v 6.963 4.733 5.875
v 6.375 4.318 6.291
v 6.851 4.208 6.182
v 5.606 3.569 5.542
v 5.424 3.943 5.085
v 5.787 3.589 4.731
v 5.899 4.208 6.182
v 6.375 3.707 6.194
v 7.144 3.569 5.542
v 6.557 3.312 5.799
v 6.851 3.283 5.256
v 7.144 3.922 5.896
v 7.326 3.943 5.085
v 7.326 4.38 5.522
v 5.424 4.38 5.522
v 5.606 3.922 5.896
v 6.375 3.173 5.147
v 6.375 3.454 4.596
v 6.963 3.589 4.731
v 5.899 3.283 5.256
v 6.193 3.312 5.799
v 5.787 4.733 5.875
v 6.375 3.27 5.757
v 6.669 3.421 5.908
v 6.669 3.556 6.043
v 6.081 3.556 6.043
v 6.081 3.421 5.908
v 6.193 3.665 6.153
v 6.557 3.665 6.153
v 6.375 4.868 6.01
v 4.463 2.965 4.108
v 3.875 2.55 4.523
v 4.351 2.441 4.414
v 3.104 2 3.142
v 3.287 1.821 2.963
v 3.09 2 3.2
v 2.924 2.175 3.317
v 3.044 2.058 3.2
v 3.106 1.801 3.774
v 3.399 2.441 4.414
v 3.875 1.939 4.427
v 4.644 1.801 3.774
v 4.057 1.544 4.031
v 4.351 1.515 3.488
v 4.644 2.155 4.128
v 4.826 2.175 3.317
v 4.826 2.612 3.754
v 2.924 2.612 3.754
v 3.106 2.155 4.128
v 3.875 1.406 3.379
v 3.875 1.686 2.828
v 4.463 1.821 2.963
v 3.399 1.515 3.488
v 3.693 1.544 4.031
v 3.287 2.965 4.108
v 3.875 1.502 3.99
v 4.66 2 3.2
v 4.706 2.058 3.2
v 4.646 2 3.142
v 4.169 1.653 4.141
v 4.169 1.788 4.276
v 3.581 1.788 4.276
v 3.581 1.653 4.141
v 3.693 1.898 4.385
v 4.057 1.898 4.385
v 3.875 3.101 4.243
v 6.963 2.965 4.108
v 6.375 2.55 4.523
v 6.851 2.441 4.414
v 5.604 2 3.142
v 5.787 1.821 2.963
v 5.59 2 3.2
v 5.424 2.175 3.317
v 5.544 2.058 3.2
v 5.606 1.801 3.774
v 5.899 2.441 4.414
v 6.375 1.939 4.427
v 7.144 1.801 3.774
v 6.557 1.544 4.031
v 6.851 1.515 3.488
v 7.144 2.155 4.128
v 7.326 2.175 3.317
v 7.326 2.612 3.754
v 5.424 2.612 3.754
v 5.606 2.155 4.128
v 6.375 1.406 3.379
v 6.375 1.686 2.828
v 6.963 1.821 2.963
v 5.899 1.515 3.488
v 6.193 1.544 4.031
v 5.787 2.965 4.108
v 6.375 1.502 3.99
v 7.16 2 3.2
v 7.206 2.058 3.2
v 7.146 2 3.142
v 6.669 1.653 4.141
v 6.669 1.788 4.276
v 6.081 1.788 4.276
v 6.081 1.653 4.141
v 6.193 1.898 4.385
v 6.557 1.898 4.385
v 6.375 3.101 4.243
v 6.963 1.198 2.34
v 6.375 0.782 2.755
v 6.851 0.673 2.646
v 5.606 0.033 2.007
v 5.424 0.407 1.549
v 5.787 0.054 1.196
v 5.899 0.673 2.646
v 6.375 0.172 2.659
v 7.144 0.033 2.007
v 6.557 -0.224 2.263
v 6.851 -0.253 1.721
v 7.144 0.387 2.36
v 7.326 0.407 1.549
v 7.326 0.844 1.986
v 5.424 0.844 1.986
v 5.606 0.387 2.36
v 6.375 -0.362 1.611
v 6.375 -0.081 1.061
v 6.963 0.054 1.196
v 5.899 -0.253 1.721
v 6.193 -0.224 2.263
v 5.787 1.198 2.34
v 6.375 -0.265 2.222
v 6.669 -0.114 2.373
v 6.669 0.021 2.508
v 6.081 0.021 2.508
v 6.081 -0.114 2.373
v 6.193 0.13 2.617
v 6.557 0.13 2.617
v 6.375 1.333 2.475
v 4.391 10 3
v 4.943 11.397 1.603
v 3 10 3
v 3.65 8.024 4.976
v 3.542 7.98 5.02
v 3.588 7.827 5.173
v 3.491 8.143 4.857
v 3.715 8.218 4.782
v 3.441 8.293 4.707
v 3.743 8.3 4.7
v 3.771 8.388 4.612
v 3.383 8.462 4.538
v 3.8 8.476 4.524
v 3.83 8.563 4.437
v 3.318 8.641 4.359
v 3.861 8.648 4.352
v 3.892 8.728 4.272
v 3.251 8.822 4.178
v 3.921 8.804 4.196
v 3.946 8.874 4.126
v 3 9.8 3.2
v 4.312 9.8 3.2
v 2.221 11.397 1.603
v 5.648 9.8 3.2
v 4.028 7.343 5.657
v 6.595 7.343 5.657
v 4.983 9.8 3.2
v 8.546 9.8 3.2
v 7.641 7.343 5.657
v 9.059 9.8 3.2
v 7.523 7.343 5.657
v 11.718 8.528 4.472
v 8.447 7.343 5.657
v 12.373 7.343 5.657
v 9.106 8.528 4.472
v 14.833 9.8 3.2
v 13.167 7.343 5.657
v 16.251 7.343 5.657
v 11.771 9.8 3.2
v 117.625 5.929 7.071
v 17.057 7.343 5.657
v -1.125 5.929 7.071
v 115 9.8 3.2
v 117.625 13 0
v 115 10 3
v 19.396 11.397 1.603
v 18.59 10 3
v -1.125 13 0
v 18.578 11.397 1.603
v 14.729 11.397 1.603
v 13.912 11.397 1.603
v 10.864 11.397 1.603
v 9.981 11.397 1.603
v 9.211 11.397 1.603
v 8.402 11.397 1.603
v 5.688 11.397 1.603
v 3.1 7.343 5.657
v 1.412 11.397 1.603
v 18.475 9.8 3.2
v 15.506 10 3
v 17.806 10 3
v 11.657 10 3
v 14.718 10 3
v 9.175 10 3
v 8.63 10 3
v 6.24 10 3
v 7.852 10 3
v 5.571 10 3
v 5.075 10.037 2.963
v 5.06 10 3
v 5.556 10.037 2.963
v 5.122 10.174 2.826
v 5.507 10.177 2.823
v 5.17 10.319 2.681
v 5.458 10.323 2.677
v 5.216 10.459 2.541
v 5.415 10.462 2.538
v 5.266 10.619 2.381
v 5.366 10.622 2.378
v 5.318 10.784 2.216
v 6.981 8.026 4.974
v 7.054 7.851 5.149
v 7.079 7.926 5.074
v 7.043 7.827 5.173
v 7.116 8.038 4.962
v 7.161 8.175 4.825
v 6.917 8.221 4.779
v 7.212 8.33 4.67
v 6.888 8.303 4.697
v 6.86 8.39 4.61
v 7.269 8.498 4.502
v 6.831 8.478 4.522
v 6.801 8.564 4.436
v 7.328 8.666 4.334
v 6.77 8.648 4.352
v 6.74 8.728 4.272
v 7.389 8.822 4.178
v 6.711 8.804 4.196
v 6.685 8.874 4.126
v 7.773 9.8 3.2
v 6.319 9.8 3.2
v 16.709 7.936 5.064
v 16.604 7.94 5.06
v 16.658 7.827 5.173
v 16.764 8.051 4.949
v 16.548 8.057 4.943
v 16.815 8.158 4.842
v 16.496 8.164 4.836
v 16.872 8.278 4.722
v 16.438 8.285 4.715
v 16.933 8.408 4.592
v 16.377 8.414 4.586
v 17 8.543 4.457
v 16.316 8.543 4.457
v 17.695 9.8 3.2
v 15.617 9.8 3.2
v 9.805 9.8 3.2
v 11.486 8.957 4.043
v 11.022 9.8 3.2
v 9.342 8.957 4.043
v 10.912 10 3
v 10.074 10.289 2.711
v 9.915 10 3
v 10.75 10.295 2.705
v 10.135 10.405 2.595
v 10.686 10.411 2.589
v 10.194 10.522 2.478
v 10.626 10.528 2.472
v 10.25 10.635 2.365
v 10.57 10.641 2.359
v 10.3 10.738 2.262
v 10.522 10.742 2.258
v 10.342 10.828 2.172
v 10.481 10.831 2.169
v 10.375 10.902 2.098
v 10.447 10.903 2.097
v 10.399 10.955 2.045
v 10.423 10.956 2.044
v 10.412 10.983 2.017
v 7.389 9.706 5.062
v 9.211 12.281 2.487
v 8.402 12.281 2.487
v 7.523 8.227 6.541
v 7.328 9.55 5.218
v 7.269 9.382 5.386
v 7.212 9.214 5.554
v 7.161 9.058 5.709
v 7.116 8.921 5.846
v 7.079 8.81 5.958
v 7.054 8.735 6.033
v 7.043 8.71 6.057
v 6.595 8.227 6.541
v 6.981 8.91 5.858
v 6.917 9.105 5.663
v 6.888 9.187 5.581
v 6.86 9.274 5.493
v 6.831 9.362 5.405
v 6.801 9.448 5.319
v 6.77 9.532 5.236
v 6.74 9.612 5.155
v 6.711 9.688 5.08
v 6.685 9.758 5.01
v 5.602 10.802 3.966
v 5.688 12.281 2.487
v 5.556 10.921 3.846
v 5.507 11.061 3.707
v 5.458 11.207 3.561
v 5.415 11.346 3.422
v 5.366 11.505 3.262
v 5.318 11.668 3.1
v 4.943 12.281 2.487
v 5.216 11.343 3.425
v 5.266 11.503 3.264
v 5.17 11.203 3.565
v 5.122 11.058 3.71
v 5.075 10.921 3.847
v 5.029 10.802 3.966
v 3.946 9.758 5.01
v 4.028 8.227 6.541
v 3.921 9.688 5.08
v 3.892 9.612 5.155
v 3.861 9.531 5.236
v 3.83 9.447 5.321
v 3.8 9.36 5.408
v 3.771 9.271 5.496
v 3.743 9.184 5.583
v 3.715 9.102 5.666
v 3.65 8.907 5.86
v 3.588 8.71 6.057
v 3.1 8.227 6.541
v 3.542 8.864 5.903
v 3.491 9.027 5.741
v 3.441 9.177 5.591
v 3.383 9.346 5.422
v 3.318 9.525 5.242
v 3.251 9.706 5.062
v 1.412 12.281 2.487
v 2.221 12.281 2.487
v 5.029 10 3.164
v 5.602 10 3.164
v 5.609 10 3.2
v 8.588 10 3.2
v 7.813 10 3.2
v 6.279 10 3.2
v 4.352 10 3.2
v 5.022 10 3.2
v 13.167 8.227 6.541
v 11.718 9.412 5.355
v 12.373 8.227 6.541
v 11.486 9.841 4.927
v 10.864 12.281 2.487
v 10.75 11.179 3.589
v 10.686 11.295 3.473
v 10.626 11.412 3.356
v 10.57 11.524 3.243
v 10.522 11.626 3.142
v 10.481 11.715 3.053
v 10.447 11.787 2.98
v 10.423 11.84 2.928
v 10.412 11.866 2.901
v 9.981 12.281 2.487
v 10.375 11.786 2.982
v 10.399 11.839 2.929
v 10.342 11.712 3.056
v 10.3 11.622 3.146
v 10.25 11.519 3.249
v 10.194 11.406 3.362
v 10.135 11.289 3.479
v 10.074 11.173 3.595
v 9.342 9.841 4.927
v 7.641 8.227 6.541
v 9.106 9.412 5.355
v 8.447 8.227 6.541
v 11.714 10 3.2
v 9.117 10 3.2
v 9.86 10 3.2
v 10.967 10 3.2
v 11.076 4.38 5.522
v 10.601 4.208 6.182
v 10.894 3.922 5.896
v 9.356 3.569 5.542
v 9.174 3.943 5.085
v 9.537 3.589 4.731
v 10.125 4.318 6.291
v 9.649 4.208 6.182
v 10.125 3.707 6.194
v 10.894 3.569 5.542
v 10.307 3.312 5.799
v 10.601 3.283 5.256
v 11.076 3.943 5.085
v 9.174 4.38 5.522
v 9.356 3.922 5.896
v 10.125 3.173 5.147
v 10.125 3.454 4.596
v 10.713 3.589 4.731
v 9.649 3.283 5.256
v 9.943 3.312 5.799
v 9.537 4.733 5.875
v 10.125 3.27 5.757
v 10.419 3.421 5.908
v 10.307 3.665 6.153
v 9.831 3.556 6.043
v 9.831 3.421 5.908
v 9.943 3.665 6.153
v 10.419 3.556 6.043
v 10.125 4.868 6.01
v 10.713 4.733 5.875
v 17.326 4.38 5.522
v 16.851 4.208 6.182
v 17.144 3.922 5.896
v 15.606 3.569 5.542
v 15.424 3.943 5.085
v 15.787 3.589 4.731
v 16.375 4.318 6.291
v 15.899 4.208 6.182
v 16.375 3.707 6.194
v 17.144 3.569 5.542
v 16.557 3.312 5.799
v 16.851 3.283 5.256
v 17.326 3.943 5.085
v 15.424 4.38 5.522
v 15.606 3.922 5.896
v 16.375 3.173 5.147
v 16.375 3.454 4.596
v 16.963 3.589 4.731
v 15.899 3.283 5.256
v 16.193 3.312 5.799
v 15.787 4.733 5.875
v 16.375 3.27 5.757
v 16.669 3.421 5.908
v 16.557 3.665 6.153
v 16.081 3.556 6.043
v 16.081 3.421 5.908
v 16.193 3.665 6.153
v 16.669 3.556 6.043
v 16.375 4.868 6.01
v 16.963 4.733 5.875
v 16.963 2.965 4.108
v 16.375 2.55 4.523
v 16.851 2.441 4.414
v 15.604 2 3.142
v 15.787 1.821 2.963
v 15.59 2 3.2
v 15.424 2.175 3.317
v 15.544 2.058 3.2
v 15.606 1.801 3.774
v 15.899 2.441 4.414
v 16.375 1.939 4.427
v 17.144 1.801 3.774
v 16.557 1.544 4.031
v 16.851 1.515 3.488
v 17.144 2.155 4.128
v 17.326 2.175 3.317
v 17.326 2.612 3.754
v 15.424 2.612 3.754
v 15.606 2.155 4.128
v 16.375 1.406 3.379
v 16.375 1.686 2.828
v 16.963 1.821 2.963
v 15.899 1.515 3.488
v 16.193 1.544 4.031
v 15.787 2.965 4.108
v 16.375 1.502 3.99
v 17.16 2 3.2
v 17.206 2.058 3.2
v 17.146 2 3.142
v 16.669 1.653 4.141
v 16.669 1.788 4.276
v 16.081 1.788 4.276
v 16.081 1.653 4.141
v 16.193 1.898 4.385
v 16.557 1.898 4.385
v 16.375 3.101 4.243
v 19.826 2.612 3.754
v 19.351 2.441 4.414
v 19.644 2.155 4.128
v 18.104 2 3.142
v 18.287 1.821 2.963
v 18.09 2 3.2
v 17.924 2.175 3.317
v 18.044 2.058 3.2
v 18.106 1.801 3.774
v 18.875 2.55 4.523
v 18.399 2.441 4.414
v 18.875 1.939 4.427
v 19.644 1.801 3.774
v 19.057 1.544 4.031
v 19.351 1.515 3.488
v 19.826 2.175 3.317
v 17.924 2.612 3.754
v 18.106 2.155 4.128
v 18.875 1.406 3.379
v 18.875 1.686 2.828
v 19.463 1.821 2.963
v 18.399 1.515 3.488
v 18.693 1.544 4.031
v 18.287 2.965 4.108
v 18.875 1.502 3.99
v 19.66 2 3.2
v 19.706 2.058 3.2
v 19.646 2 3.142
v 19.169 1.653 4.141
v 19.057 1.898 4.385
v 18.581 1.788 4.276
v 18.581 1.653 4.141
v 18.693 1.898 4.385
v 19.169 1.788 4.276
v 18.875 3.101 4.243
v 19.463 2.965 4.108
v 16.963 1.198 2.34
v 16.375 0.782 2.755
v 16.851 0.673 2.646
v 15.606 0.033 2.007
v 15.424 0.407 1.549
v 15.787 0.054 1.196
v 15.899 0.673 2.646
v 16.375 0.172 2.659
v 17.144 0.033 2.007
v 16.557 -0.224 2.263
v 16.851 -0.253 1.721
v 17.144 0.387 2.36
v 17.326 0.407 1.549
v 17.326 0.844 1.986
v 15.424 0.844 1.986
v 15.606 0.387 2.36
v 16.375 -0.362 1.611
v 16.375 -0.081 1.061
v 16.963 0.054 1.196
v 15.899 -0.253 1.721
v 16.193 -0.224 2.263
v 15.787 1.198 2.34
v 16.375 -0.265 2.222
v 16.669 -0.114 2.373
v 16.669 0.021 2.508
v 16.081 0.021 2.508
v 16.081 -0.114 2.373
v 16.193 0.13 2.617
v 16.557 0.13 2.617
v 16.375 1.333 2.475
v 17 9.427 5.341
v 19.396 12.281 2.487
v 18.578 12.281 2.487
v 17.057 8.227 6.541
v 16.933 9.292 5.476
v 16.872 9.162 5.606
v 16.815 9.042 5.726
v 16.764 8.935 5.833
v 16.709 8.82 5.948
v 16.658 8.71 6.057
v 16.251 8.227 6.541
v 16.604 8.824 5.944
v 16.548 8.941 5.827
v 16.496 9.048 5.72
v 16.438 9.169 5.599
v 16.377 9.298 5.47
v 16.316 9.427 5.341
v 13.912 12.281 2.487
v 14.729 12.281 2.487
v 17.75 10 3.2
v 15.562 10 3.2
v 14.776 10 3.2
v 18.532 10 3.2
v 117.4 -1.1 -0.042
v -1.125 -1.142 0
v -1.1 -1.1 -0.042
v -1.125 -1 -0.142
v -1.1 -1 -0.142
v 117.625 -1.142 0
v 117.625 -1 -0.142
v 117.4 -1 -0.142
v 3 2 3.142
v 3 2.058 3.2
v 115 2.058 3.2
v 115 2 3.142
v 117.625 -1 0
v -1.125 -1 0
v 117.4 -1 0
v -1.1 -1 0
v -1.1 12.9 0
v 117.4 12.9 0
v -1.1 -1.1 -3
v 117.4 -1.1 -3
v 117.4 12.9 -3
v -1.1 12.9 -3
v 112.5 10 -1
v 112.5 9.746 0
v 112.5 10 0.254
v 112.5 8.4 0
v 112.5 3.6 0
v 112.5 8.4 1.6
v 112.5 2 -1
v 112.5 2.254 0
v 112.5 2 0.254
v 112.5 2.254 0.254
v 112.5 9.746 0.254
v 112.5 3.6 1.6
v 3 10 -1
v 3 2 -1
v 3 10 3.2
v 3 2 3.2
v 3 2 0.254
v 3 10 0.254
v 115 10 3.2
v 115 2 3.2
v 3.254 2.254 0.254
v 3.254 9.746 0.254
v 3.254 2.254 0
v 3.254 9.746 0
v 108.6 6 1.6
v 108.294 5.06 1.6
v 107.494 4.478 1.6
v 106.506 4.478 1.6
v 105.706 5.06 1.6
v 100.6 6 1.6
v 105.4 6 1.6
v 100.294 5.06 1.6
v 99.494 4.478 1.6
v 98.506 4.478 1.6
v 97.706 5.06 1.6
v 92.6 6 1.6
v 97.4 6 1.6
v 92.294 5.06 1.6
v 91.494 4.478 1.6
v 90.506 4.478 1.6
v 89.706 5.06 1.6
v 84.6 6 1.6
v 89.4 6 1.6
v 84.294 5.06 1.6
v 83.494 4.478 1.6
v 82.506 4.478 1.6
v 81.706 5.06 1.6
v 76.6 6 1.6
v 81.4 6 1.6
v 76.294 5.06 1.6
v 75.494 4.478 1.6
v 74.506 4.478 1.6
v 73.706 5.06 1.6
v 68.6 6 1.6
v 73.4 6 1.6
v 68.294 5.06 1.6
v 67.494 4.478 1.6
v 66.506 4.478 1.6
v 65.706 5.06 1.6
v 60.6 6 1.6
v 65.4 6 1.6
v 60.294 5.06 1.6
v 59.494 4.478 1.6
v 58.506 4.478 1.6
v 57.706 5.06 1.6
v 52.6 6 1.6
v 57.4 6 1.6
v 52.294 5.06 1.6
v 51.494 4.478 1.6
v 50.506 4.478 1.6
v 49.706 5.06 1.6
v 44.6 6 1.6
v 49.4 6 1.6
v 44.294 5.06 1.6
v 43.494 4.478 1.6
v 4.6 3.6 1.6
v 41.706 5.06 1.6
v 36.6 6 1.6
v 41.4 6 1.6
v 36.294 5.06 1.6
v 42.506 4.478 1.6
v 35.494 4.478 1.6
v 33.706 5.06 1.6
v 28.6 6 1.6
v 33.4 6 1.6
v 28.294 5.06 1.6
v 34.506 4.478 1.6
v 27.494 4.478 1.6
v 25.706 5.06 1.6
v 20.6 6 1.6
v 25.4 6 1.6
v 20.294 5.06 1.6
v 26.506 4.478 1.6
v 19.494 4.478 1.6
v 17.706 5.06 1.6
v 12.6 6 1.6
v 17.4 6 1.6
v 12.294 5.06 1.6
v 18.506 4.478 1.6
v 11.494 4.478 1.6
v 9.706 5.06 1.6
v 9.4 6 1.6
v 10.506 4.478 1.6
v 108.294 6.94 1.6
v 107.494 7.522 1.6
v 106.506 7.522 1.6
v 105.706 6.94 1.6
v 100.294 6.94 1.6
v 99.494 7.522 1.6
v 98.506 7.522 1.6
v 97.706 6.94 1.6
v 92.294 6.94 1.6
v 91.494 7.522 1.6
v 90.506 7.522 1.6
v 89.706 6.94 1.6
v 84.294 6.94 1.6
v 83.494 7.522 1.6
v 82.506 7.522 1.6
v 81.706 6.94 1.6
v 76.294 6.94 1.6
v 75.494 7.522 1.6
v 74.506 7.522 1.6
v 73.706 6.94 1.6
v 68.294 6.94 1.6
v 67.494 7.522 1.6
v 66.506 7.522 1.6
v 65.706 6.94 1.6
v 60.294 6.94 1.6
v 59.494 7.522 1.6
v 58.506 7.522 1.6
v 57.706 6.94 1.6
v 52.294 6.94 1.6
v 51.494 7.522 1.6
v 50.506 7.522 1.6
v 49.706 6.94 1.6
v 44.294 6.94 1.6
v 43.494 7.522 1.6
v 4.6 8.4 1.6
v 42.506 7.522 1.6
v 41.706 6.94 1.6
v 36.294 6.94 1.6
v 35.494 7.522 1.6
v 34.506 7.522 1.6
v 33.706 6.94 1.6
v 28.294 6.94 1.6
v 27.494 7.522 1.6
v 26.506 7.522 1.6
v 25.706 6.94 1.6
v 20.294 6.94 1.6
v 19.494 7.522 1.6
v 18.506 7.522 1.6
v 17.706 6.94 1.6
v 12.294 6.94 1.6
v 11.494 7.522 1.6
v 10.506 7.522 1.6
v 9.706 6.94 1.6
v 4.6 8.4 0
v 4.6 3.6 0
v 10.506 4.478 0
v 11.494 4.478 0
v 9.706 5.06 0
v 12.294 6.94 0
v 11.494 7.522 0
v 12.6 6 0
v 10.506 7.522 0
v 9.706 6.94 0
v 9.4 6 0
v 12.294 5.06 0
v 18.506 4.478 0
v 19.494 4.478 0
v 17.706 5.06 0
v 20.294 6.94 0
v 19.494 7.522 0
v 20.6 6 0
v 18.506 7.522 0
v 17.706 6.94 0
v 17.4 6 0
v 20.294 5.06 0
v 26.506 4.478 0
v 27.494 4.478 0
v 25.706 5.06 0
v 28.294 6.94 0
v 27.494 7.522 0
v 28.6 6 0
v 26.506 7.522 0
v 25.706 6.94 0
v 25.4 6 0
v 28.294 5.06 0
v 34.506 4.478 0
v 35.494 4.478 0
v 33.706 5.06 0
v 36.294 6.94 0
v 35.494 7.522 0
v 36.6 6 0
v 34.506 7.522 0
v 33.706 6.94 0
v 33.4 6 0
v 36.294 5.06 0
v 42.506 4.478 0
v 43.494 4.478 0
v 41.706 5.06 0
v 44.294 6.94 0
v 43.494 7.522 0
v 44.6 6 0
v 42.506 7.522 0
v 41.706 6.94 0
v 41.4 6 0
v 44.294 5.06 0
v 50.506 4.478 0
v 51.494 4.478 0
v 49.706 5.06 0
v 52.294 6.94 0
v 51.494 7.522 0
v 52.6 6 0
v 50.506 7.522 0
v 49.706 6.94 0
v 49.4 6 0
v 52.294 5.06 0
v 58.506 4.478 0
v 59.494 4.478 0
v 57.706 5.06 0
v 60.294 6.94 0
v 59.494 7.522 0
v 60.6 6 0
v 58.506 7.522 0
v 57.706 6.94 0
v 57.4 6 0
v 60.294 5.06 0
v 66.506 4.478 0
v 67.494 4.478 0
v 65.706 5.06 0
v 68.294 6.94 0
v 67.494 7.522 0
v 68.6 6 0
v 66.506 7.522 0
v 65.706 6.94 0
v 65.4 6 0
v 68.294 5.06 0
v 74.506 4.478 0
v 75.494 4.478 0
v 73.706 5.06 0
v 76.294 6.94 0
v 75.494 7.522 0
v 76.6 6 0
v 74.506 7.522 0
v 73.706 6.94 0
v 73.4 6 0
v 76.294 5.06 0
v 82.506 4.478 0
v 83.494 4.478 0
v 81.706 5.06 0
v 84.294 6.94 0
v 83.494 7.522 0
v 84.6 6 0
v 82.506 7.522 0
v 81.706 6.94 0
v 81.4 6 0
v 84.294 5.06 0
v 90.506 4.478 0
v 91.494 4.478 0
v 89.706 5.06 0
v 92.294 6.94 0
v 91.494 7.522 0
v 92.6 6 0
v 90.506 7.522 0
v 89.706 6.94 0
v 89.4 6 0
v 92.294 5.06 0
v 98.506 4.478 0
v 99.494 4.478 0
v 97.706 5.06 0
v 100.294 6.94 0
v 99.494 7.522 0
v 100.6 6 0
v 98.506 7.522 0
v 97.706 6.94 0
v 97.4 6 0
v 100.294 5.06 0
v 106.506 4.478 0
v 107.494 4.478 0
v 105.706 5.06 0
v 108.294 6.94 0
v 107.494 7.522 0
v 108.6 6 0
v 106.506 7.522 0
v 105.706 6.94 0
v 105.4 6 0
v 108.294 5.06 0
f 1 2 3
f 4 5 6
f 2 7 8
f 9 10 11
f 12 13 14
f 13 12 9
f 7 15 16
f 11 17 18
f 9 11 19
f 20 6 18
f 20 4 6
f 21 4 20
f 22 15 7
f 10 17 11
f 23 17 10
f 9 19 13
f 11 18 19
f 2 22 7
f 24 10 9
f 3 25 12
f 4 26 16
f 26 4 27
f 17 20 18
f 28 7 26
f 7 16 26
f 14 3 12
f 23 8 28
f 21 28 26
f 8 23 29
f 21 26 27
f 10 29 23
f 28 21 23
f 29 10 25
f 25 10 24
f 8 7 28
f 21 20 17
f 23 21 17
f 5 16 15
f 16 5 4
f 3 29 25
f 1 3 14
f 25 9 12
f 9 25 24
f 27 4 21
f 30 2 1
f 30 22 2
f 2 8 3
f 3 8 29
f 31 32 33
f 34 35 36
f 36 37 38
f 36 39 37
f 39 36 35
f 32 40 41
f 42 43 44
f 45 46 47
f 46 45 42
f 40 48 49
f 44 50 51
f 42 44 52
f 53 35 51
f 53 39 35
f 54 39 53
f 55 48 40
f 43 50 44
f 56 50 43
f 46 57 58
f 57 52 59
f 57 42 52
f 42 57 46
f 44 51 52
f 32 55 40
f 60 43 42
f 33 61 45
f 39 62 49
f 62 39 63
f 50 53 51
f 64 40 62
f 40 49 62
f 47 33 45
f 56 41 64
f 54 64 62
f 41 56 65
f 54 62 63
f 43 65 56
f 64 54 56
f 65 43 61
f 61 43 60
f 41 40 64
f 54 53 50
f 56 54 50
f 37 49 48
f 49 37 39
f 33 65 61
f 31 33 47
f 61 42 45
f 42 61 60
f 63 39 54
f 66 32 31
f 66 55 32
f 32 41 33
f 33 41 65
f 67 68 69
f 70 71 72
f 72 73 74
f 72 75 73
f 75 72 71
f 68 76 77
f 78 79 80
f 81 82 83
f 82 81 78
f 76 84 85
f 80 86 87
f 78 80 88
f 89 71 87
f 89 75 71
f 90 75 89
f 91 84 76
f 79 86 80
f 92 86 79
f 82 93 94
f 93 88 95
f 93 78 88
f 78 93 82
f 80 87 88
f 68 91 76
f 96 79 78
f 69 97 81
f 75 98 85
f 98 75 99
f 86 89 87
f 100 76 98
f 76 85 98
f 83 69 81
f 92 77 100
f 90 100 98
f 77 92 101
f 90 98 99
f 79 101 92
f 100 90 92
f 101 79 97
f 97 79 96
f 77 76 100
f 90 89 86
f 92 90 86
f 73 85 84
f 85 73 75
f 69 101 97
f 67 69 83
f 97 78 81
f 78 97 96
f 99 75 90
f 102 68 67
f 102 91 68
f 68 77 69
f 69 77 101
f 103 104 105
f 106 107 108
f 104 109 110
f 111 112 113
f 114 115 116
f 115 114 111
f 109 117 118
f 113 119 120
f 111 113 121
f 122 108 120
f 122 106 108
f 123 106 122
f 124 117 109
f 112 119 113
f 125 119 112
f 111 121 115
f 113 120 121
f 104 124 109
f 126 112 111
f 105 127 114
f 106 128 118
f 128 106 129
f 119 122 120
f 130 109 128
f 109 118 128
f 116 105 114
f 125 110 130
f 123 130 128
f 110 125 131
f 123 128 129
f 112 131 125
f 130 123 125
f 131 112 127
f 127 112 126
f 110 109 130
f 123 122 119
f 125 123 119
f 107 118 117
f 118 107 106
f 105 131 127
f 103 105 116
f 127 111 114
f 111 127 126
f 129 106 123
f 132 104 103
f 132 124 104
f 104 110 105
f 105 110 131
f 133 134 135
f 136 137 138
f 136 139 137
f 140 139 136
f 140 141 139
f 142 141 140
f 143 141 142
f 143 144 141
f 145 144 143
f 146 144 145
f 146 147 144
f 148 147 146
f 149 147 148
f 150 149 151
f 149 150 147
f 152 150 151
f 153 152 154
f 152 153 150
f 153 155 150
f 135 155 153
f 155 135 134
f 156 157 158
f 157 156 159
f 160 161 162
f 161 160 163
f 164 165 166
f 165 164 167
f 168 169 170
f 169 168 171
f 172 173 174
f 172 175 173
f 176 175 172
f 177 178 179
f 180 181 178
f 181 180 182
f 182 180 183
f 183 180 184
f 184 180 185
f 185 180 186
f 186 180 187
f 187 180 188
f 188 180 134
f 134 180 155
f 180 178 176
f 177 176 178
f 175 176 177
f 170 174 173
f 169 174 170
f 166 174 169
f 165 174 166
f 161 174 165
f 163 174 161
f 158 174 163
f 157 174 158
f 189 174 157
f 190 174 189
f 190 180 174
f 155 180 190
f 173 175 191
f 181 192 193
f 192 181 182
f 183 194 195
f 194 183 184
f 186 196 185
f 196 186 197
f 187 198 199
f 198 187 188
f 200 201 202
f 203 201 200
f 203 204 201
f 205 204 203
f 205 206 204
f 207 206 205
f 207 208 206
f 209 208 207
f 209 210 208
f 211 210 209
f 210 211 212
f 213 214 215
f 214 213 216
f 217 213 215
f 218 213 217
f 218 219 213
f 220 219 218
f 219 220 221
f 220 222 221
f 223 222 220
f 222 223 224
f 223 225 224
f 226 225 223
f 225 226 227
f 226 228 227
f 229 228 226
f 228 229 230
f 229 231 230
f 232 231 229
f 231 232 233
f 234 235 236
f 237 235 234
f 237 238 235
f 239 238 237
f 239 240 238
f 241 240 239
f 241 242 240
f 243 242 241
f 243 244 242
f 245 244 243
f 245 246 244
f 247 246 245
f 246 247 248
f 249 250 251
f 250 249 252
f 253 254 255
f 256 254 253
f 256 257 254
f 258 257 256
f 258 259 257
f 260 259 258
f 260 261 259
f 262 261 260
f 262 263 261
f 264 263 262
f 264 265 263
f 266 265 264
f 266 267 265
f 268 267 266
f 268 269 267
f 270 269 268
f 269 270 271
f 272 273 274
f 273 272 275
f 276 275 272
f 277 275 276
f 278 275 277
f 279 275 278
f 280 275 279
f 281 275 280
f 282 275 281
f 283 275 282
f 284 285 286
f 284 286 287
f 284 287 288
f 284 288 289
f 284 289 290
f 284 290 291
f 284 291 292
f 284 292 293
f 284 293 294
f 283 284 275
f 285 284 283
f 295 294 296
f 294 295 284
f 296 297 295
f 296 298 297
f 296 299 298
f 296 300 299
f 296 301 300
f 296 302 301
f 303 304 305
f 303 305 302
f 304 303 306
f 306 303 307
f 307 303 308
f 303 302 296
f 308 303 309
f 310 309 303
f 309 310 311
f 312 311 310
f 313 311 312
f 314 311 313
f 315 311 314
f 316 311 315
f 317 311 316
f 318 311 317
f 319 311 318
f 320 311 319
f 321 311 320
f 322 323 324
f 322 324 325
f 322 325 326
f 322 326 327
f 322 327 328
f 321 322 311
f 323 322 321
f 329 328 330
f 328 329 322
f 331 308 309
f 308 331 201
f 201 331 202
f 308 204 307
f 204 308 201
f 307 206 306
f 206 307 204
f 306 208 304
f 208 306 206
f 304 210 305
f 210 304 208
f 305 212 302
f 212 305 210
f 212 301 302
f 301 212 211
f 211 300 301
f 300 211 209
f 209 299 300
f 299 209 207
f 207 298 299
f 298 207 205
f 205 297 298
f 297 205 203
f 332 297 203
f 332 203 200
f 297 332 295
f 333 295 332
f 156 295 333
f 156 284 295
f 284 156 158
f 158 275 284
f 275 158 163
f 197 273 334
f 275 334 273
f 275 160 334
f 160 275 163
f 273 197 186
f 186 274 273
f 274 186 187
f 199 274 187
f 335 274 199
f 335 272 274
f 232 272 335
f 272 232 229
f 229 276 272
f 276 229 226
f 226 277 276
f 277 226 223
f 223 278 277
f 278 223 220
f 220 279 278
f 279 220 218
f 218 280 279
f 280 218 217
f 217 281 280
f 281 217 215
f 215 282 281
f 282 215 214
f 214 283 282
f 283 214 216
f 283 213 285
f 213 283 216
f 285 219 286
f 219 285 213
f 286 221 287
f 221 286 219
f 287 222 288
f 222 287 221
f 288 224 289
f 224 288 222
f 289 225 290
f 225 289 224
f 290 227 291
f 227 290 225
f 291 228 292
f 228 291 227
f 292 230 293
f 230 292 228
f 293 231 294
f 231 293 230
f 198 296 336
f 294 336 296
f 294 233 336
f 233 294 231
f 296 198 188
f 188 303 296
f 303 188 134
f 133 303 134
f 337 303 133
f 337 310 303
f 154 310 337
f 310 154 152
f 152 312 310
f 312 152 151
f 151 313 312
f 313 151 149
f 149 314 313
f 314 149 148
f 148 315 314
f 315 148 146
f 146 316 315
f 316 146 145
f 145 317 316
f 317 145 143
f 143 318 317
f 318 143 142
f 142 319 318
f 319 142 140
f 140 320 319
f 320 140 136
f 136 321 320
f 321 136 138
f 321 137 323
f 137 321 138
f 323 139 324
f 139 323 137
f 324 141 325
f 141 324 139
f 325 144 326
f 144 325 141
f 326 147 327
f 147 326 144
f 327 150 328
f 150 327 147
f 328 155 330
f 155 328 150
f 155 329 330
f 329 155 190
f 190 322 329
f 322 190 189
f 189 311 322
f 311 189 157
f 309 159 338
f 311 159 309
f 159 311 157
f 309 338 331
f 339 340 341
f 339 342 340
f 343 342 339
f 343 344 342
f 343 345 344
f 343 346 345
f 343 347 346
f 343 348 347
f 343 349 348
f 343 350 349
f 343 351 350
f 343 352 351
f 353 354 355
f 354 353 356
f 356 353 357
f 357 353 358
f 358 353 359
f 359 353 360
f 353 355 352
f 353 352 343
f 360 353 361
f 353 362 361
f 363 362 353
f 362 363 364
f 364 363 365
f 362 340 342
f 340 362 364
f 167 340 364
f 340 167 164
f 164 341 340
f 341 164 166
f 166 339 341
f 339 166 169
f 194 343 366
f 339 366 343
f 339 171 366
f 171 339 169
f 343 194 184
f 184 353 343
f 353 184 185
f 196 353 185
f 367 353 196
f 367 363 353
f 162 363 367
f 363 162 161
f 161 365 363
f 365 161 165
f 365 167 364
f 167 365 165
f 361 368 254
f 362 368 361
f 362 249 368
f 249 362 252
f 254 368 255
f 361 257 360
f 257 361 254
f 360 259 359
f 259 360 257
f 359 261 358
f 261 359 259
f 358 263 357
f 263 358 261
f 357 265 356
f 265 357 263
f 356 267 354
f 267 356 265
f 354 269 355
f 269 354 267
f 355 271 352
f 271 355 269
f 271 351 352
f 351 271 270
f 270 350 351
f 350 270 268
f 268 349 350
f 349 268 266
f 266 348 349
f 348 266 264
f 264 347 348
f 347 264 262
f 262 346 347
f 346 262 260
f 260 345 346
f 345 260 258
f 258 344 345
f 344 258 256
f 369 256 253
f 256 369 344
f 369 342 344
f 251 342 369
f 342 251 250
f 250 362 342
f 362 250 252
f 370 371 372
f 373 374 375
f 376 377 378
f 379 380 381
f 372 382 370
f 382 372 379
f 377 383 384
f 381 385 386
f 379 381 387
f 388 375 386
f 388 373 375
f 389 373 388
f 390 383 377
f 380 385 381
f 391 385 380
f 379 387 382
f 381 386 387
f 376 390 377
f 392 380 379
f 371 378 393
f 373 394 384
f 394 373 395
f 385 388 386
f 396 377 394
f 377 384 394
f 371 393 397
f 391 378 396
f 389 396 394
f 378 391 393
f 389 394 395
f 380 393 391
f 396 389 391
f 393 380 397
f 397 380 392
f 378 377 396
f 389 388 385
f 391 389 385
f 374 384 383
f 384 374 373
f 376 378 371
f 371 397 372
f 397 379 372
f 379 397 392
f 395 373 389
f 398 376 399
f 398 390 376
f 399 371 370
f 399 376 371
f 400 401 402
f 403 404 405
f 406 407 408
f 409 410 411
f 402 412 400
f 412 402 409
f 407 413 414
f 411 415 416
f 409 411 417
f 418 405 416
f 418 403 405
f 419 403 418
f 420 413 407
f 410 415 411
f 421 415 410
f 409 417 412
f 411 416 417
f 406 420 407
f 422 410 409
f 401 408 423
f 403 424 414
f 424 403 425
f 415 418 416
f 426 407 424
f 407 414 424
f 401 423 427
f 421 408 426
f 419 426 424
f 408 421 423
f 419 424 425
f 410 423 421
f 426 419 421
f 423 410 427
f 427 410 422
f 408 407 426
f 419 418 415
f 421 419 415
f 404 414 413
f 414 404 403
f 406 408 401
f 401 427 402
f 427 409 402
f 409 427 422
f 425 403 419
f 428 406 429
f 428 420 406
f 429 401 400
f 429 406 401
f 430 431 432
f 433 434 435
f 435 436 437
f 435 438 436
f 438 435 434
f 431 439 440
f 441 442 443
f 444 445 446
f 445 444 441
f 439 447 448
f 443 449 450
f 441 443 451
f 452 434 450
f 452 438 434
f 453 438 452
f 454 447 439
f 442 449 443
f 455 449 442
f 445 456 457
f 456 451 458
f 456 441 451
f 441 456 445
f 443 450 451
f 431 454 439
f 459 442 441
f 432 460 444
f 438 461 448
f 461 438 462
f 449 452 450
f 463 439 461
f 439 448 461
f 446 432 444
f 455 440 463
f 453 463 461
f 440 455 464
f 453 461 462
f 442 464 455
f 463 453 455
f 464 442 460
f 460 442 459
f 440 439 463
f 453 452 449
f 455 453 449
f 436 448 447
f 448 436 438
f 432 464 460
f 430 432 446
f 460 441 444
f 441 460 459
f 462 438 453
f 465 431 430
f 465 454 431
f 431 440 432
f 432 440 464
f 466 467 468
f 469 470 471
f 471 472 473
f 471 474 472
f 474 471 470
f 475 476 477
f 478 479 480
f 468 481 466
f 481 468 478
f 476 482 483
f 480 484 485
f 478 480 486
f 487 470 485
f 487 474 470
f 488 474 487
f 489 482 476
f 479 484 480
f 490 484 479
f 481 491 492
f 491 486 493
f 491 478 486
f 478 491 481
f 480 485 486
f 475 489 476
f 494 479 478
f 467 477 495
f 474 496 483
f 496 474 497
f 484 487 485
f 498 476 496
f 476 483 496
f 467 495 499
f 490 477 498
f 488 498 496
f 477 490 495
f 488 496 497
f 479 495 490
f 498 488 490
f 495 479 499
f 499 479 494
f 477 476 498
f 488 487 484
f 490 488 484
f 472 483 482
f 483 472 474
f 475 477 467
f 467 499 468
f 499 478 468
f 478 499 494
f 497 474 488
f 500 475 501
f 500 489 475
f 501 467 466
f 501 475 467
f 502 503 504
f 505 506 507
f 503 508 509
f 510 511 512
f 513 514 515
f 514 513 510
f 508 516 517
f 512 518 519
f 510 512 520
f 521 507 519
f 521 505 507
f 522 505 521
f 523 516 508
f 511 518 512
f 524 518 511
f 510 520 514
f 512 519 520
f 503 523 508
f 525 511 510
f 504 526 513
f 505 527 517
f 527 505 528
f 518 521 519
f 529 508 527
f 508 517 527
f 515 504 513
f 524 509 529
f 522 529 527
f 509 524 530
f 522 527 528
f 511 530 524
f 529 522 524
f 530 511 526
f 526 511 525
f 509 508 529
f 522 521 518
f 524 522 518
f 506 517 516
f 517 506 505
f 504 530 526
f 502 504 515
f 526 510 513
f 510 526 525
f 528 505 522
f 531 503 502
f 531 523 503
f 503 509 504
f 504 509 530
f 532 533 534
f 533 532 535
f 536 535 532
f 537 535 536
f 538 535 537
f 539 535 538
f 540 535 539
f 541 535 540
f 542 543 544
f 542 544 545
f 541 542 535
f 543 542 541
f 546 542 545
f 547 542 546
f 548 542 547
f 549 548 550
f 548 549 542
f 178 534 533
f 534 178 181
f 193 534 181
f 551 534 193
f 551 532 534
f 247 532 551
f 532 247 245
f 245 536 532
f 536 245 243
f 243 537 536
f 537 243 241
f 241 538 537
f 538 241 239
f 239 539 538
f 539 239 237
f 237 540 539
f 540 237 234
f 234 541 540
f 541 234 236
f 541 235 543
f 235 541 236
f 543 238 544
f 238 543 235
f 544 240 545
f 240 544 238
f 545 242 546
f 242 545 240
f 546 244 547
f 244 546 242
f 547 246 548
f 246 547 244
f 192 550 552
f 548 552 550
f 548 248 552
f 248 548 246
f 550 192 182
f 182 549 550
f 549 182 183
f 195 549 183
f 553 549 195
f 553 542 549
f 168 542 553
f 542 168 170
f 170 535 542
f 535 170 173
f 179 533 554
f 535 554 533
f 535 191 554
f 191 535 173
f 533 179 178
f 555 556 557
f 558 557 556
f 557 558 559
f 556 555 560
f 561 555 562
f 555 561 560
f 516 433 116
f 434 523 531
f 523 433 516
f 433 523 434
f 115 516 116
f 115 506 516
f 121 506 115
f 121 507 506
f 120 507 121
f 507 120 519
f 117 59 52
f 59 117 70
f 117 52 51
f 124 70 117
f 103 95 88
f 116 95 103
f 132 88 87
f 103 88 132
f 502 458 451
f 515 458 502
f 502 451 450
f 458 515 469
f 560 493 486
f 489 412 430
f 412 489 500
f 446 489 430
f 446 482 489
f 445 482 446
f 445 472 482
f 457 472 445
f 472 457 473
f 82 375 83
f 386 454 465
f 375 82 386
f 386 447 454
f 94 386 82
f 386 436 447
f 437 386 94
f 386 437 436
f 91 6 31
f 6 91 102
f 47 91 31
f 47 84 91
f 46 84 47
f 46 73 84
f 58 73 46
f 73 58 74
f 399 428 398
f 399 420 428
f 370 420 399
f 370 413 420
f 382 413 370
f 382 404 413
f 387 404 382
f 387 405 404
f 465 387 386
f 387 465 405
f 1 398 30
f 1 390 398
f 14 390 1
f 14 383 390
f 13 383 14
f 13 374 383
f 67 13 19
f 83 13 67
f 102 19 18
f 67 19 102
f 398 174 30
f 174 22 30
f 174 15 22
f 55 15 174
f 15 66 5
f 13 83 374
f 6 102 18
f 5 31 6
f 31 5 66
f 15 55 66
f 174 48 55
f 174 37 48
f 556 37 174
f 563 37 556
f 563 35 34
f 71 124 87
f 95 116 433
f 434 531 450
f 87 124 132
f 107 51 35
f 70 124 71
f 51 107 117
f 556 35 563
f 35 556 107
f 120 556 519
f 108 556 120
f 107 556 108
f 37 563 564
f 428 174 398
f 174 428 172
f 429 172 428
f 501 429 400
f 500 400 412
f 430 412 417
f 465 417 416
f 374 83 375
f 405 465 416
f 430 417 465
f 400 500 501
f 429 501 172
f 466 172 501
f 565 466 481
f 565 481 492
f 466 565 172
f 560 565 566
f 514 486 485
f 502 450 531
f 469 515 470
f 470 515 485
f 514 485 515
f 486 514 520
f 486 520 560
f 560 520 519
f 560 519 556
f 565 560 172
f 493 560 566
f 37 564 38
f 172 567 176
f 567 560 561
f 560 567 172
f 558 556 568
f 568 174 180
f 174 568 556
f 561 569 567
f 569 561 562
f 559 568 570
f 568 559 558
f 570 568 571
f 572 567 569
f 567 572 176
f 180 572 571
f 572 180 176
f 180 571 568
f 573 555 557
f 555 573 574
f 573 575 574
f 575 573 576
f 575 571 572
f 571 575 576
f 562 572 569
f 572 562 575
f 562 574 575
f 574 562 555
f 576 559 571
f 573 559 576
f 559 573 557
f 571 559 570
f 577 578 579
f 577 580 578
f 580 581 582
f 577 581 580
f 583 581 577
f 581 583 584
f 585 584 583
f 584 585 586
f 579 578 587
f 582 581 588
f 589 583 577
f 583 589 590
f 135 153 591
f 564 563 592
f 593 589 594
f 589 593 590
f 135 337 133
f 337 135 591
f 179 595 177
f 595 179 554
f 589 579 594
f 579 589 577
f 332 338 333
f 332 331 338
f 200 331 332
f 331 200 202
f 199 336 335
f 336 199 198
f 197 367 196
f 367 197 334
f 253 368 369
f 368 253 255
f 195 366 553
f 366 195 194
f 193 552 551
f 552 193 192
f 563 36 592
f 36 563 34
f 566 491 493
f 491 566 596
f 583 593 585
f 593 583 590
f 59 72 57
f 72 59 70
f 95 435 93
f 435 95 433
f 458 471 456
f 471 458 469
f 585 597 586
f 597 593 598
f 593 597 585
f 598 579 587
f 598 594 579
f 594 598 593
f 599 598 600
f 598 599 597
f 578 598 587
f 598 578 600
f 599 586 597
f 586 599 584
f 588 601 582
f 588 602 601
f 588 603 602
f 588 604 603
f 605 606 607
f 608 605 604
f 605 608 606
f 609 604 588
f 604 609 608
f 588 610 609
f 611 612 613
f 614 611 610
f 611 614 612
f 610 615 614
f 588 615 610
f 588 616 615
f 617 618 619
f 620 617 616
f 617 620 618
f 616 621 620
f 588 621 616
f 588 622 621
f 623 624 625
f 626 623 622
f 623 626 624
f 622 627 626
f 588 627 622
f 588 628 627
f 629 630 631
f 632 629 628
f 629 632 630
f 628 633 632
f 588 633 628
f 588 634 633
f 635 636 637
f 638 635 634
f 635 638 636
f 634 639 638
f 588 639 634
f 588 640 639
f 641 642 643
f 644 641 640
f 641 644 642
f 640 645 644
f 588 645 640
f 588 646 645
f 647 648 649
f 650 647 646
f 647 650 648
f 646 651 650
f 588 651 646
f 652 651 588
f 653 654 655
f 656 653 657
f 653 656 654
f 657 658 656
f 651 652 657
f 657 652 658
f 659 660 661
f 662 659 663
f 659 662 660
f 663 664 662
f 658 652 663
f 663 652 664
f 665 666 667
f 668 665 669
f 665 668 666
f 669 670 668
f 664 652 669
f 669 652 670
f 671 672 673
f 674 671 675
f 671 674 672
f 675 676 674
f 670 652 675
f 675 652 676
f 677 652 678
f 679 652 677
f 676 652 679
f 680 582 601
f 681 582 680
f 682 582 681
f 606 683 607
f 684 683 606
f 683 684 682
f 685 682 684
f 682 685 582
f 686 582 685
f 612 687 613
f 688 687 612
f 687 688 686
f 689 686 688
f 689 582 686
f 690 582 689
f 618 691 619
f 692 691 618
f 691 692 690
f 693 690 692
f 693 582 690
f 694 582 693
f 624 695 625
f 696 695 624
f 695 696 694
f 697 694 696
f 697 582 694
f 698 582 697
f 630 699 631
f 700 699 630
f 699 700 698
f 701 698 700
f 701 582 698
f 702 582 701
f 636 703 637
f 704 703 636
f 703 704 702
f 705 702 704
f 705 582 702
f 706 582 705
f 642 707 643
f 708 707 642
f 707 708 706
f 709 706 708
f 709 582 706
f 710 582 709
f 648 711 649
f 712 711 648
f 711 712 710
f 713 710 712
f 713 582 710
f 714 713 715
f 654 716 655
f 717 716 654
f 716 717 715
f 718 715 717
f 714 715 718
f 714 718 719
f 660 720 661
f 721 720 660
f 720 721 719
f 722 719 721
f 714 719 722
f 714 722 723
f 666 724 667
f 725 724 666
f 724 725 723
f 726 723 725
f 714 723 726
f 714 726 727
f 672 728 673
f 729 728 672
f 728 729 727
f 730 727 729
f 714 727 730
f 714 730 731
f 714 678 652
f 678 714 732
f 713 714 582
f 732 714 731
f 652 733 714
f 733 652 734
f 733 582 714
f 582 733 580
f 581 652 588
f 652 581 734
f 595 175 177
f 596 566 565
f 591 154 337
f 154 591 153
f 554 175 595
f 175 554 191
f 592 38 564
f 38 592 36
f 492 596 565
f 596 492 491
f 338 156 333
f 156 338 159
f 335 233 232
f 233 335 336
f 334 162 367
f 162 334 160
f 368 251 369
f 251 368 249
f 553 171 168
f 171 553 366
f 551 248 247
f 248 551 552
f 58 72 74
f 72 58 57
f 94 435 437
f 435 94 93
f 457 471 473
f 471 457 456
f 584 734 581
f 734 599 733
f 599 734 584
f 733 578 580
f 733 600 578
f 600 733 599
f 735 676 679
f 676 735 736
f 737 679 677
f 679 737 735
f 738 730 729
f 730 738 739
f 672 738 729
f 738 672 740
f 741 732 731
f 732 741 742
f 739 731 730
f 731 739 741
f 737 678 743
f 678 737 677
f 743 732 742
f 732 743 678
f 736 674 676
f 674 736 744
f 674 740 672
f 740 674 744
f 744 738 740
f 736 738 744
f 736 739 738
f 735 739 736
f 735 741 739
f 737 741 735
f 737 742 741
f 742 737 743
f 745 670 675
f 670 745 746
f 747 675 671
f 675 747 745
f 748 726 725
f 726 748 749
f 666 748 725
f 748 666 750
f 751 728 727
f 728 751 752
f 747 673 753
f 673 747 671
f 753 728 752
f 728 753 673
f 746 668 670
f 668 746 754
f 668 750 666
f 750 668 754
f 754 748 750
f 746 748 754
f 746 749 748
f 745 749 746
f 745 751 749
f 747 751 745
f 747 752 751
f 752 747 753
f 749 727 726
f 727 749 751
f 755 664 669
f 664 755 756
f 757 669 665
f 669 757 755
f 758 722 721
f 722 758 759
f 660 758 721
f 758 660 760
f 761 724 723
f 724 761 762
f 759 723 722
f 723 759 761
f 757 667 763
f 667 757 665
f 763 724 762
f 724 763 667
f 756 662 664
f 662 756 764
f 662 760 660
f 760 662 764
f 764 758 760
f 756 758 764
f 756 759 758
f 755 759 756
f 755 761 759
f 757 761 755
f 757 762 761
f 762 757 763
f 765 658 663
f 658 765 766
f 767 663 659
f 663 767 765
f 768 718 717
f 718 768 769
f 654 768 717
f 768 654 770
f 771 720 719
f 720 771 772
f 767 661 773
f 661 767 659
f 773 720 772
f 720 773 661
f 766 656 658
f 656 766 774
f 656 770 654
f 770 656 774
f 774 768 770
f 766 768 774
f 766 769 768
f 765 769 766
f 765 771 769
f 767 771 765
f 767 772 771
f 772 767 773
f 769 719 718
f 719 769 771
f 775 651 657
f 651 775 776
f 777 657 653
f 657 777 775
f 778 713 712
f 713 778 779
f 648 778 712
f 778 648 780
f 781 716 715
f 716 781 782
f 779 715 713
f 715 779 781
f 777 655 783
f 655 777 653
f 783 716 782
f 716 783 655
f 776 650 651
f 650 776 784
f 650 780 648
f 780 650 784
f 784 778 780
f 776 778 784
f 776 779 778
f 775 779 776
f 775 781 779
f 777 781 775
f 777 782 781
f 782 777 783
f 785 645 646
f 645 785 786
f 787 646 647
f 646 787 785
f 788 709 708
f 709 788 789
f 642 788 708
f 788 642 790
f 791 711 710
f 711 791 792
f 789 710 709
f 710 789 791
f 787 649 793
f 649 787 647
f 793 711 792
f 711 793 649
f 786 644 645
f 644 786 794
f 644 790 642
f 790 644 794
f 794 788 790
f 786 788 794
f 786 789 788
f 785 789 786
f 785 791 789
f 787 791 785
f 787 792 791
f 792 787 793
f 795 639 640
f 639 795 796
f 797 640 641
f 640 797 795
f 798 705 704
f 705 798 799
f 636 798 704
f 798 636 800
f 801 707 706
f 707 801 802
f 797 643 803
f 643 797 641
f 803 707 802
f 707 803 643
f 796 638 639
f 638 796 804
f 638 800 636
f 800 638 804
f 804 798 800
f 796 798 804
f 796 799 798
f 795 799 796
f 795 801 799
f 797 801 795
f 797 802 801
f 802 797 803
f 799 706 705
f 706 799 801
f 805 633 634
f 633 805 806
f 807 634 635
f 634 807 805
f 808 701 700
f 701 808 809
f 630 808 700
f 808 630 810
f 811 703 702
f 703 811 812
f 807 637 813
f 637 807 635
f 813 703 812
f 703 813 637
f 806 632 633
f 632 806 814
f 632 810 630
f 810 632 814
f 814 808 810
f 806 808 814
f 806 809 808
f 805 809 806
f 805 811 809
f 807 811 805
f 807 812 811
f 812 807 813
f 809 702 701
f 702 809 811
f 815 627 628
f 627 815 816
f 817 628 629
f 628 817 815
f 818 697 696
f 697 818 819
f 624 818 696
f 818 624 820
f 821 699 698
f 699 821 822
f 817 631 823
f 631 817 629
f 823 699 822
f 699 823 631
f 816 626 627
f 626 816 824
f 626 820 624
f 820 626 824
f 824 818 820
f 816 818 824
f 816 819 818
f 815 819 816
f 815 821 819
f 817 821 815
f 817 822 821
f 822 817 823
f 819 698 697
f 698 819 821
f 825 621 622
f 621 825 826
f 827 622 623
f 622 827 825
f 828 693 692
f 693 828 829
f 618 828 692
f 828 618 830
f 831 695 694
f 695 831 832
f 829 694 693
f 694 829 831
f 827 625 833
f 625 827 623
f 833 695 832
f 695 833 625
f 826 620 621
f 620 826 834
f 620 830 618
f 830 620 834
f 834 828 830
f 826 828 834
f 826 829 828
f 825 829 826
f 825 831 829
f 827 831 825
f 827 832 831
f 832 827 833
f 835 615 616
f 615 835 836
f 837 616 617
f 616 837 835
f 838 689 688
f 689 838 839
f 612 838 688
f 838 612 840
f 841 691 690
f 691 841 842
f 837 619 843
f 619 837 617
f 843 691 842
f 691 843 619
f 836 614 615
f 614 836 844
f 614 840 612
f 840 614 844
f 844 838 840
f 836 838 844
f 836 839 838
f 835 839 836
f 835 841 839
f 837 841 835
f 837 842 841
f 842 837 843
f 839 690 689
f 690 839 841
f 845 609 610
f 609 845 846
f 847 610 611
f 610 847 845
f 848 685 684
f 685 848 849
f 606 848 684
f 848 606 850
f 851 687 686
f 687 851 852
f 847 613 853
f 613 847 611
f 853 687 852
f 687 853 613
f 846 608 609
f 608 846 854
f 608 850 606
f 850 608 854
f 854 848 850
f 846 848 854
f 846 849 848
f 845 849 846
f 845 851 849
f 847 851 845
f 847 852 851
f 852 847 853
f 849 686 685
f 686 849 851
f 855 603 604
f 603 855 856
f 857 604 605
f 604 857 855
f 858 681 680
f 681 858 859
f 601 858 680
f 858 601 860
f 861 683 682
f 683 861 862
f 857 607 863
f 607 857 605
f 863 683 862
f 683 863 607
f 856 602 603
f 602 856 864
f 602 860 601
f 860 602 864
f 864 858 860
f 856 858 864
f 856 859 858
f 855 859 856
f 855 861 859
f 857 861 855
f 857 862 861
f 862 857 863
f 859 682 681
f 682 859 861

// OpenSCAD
// file: ../OpenSCAD/brailleAndText.scad
/*
Braille Module
http://creativecommons.org/licenses/by/3.0/
*/


// mm sizes from http://dots.physics.orst.edu/gs_layout.html
radius = 0.25;
spacing = 2.5;
startOffset = 3.75;
distance = startOffset + spacing;

plate_height = 10;
plate_thickness = 10;   // was 2.

$fn = 10;



module letter(bitmap, char) {
//    echo(char);
	row_size = 2;
	col_size = 3;
	bitmap_size = row_size * col_size;
	
	function loc_x(loc) = floor(loc / row_size) * spacing + spacing;
	function loc_y(loc) = loc % row_size * spacing  + (distance-spacing)/2;

    translate([0, loc_y(-1), -2]) {
        rotate([270, 0, 90]) {
            linear_extrude(height = 1.25)
            text(char, 6);
        }
    }
	
    for (loc = [0:bitmap_size - 1]) {
		if (bitmap[loc] != 0) {
			union() {
				translate(v = [loc_x(loc), loc_y(loc), 0]) {
					sphere(radius = radius* bitmap[loc], center = true);
				}
			}
		}
	}
}


module braille_char(char) {
	if (char == "A" || char == "a") {
		letter([
			1,0,
			0,0,
			0,0
		], char);
	} else if (char == "B" || char == "b") {
		letter([
			1,0,
			1,0,
			0,0
		], char);
	} else if (char == "C" || char == "c") {
		letter([
			1,1,
			0,0,
			0,0
		], char);
	} else if (char == "D" || char == "d") {
		letter([
			1,1,
			0,1,
			0,0
		], char);
	} else if (char == "E" || char == "e") {
		letter([
			1,0,
			0,1,
			0,0
		], char);
	} else if (char == "F" || char == "f") {
		letter([
			1,1,
			1,0,
			0,0
		], char);
	} else if (char == "G" || char == "g") {
		letter([
			1,1,
			1,1,
			0,0
		], char);
	} else if (char == "H" || char == "h") {
		letter([
			1,0,
			1,1,
			0,0
		], char);
	} else if (char == "I" || char == "i") {
		letter([
			0,1,
			1,0,
			0,0
		], char);
	} else if (char == "J" || char == "j") {
		letter([
			0,1,
			1,1,
			0,0
		], char);
	} else if (char == "K" || char == "k") {
		letter([
			1,0,
			0,0,
			1,0
		], char);
	} else if (char == "L" || char == "l") {
		letter([
			1,0,
			1,0,
			1,0
		], char);
	} else if (char == "M" || char == "m") {
		letter([
			1,1,
			0,0,
			1,0
		], char);
	} else if (char == "N" || char == "n") {
		letter([
			1,1,
			0,1,
			1,0
		], char);
	} else if (char == "O" || char == "o") {
		letter([
			1,0,
			0,1,
			1,0
		], char);
	} else if (char == "P" || char == "p") {
		letter([
			1,1,
			1,0,
			1,0
		], char);
	} else if (char == "Q" || char == "q") {
		letter([
			1,1,
			1,1,
			1,0
		], char);
	} else if (char == "R" || char == "r") {
		letter([
			1,0,
			1,1,
			1,0
		], char);
	} else if (char == "S" || char == "s") {
		letter([
			0,1,
			1,0,
			1,0
		], char);
	} else if (char == "T" || char == "t") {
		letter([
			0,1,
			1,1,
			1,0
		], char);
	} else if (char == "U" || char == "u") {
		letter([
			1,0,
			0,0,
			1,1
		], char);
	} else if (char == "V" || char == "v") {
		letter([
			1,0,
			1,1,
			1,0
		], char);
	} else if (char == "W" || char == "w") {
		letter([
			0,1,
			1,1,
			0,1
		], char);
	} else if (char == "X" || char == "x") {
		letter([
			1,1,
			0,0,
			1,1
		], char);
	} else if (char == "Y" || char == "y") {
		letter([
			1,1,
			0,1,
			1,1
		], char);
	} else if (char == "Z" || char == "z") {
		letter([
			1,0,
			0,1,
			1,1
		], char);
    } else if (char == " ") {
		letter([
			0,0,
			0,0,
			0,0
		], char);
	} else {
		echo("Invalid Character: ", char);
	}

}

module braille_str(chars) {
    char_count = len(chars);
	echo(str("Total Width of ", chars, " : ",  distance * char_count, "mm"));
	union() {
		for (count = [0:char_count-1]) {
			translate(v = [0, count * distance, plate_thickness]) {
				braille_char(chars[count]);
			}
		}
		translate(v = [0, -distance/2, 0]) {
			color([0,0,1]) {
				cube(size = [plate_height, distance * (char_count+1), plate_thickness]);
			}
            }                                                      
	}
}

function lenText(txt="Hi") = distance * len(txt);

module printTextAndBraille(textToPrint) {
    blockLen = lenText(textToPrint);
    union()
    {
        difference() {                      // remove second box from first
            rotate([0,45,0]) {              // make it on its edge
                braille_str((textToPrint)); // make a long box
            }
            translate([0, -3.25, -8]) {     // move in right place
                cube(size = [14, (blockLen+8), 8]);
            }
        } 
        translate([0.1, -3.1, -3]) {     // move in right place
            cube(size = [14, (blockLen+6), 3]); 
        }
    }                                 
}

printTextAndBraille("HELLO CalLUM");
// file: ../openSCADLibs/lego_brick_builder.scad
/*

 Basic Lego brick builder module for OpenScad by Jorg Janssen 2013 (CC BY-NC 3.0) 
 To use this in your own projects add:

 use <path_to_this_file/lego_brick_builder.scad>
 brick (length, width, height [,smooth]);

 Length and width are in standard lego brick dimensions. 
 Height is in flat brick heights, so for a normal lego brick height = 3.
 Add optional smooth = true for a brick without studs. 
 Use height = 0 to just put studs/knobs on top of other things.

 */
$fn = 150;

// and this is how it's done:

FLU = 1.6; // Fundamental Lego Unit = 1.6 mm

BRICK_WIDTH = 5*FLU; // basic brick width
BRICK_HEIGHT = 6*FLU; // basic brick height
PLATE_HEIGHT = 2*FLU; // basic plate height
WALL_THICKNESS = FLU; // outer wall of the brick
STUD_RADIUS = 1.5*FLU; // studs are the small cylinders on top of the brick with the lego logo ('nopje' in Dutch)
STUD_HEIGHT = FLU; 
ANTI_STUD_RADIUS = 0.5*4.07*FLU;  // an anti stud is the hollow cylinder inside bricks that have length > 1 and width > 1
PIN_RADIUS = FLU; // a pin is the small cylinder inside bricks that have length = 1 or width = 1
SUPPORT_THICKNESS = 0.254; // support is the thin surface between anti studs, pins and walls, your printer might not print this thin, try thicker!
EDGE = 0.254; // this is the width and height of the bottom line edge of smooth bricks
CORRECTION = 0.1; // addition to each size, to make sure all parts connect by moving them a little inside each other

module brick(length = 4, width = 2, height = 3, smooth = false){

	// brick shell
	difference(){
		cube(size = [length*BRICK_WIDTH,width*BRICK_WIDTH,height*PLATE_HEIGHT]);
		translate([WALL_THICKNESS,WALL_THICKNESS,-WALL_THICKNESS])
		union(){
			cube(size = [length*BRICK_WIDTH-2*WALL_THICKNESS,width*BRICK_WIDTH-2*WALL_THICKNESS,height*PLATE_HEIGHT]);
			// stud inner holes, radius = pin radius
			if (!smooth) {
				translate([STUD_RADIUS+WALL_THICKNESS,STUD_RADIUS+WALL_THICKNESS,height*PLATE_HEIGHT])
				for (y = [0:width-1]){
					for (x = [0:length-1]){
						translate ([x*BRICK_WIDTH-WALL_THICKNESS,y*BRICK_WIDTH-WALL_THICKNESS,-CORRECTION])
						cylinder(h=WALL_THICKNESS+2*CORRECTION,r=PIN_RADIUS);
					}
				}
			}
			// small bottom line edge for smooth bricks
			else {
				translate([-WALL_THICKNESS-CORRECTION,-WALL_THICKNESS-CORRECTION,FLU-CORRECTION]) 
				difference() {
					cube([length*BRICK_WIDTH+2*CORRECTION,width*BRICK_WIDTH+2*CORRECTION,EDGE+CORRECTION]);
					translate([EDGE+CORRECTION,EDGE+CORRECTION,-CORRECTION])
					cube([length*BRICK_WIDTH-2*EDGE,width*BRICK_WIDTH-2*EDGE,EDGE+3*CORRECTION]); 
				}
			}
		}
	}
	// Studs
	if(!smooth){
		translate([STUD_RADIUS+WALL_THICKNESS,STUD_RADIUS+WALL_THICKNESS,height*PLATE_HEIGHT])
		for (y = [0:width-1]){
			for (x = [0:length-1]){
				translate ([x*BRICK_WIDTH,y*BRICK_WIDTH,-CORRECTION])
				difference(){
					cylinder(h=STUD_HEIGHT+CORRECTION, r=STUD_RADIUS);
					// Stud inner holes
					translate([0,0,-CORRECTION])
					cylinder(h=0.5*STUD_HEIGHT+CORRECTION,r=PIN_RADIUS);
				}
				// tech logo - disable this if your printer isn't capable of printing this small
				if ( length > width){
					translate([x*BRICK_WIDTH+0.8,y*BRICK_WIDTH-1.9,STUD_HEIGHT-CORRECTION])
					resize([1.2*1.7,2.2*1.7,0.254+CORRECTION])
					rotate(a=[0,0,90])
					import("tech.stl");
				}
				else {
					translate([x*BRICK_WIDTH-1.9,y*BRICK_WIDTH-0.8,STUD_HEIGHT-CORRECTION])
					resize([2.2*1.7,1.2*1.7,0.254+CORRECTION])
					import("tech.stl");				
				}				
				/* 
				// Alternative 2-square logo
				translate ([x*BRICK_WIDTH+CORRECTION,y*BRICK_WIDTH-CORRECTION,STUD_HEIGHT-CORRECTION])		
				cube([1,1,2*CORRECTION]);
				translate ([x*BRICK_WIDTH-0.9,y*BRICK_WIDTH-0.9,STUD_HEIGHT-CORRECTION])		
				cube([1,1,0.3]);
				*/				
			}
		}
	}
	// Pins x
	if (width == 1 && length > 1) {	
			for (x = [1:length-1]){
				translate([x*BRICK_WIDTH,0.5*BRICK_WIDTH,0])
				cylinder(h=height*PLATE_HEIGHT-WALL_THICKNESS+CORRECTION,r=PIN_RADIUS);
				// Supports
				if (height > 1) {
				translate([x*BRICK_WIDTH-0.5*SUPPORT_THICKNESS,CORRECTION,STUD_HEIGHT])
				cube(size=[SUPPORT_THICKNESS,BRICK_WIDTH-2*CORRECTION,height*PLATE_HEIGHT-STUD_HEIGHT-WALL_THICKNESS+CORRECTION]);
			}
		}
	}
	// Pins y
	if (length == 1 && width > 1) {	
			for (y = [1:width-1]){
			translate([0.5*BRICK_WIDTH,y*BRICK_WIDTH,0])
			cylinder(h=height*PLATE_HEIGHT-WALL_THICKNESS+CORRECTION,r=PIN_RADIUS);
			// Supports
			if (height > 1) {
			translate([CORRECTION,y*BRICK_WIDTH-0.5*SUPPORT_THICKNESS,STUD_HEIGHT])
			cube(size=[BRICK_WIDTH-2*CORRECTION,SUPPORT_THICKNESS,height*PLATE_HEIGHT-STUD_HEIGHT-WALL_THICKNESS+CORRECTION]);}
			
		}
	}
	// Anti Studs
	if (width > 1 && length > 1){
		difference(){
			union(){
				for(y = [1:width-1]){
					for(x = [1:length-1]){
						// anti studs
						translate([x*BRICK_WIDTH,y*BRICK_WIDTH,0])
						cylinder (h=height*PLATE_HEIGHT-WALL_THICKNESS+CORRECTION, r = ANTI_STUD_RADIUS);
						// Supports
						if (height > 1){
							// Support x
							if (x%2 == 0 && (length%2 == 0 || length%4 == 1 && x<length/2 || length%4 == 3 && x>length/2) || x%2 == 1 && (length%4 == 3 && x<length/2 || length%4 == 1 && x>length/2)) {
								translate([BRICK_WIDTH*x-0.5*SUPPORT_THICKNESS,y*BRICK_WIDTH-BRICK_WIDTH+WALL_THICKNESS-CORRECTION,STUD_HEIGHT])
								cube(size=[SUPPORT_THICKNESS,2*BRICK_WIDTH-2*WALL_THICKNESS,height*PLATE_HEIGHT-STUD_HEIGHT-WALL_THICKNESS+CORRECTION]);
							}
							// Supports y							
							if (y%2 == 0 && (width%2 == 0 || width%4 == 1 && y<width/2 || width%4 == 3 && y>width/2) || y%2 == 1 && (width%4 == 3 && y<width/2 || width%4 == 1 && y>width/2)) {
								translate([x*BRICK_WIDTH-BRICK_WIDTH+WALL_THICKNESS-CORRECTION,BRICK_WIDTH*y-0.5*SUPPORT_THICKNESS,STUD_HEIGHT])
								cube(size=[2*BRICK_WIDTH-2*WALL_THICKNESS,SUPPORT_THICKNESS,height*PLATE_HEIGHT-STUD_HEIGHT-WALL_THICKNESS+CORRECTION]);
							}
						}
					}
				}
			}
			union(){
				for(y = [1:width-1]){
					for(x = [1:length-1]){
						// hollow anti studs
						translate([x*BRICK_WIDTH,y*BRICK_WIDTH,-WALL_THICKNESS])
						cylinder (h=height*PLATE_HEIGHT, r = STUD_RADIUS);				
					}
				}
			}
		}		
	}
}
	
// file: ../OpenSCAD/TextAndBrailleLegoBlock.scad
 include <../openSCADLibs/lego_brick_builder.scad>
 include <../OpenSCAD/brailleAndText.scad>;

module brickAndText(text) {
    txtLen = distance * len(text);
    echo(distance);
    difference() {
        rotate([180,180,90])
            translate([-13, 2, 0])
                printTextAndBraille(text);
        translate([3, 2, -1]) 
            cube([txtLen - 3, BRICK_WIDTH, 4]);
    }
    translate([3,2,0])
        brick(floor(txtLen / BRICK_WIDTH),1,1, true);    
}

// use <../BPNodesV2/TextNBraille.scad>
//brickAndText("This is a test string");  
// main file
use <../OpenSCAD/TextAndBrailleLegoBlock.scad>

brickAndText("WAV:              ");
